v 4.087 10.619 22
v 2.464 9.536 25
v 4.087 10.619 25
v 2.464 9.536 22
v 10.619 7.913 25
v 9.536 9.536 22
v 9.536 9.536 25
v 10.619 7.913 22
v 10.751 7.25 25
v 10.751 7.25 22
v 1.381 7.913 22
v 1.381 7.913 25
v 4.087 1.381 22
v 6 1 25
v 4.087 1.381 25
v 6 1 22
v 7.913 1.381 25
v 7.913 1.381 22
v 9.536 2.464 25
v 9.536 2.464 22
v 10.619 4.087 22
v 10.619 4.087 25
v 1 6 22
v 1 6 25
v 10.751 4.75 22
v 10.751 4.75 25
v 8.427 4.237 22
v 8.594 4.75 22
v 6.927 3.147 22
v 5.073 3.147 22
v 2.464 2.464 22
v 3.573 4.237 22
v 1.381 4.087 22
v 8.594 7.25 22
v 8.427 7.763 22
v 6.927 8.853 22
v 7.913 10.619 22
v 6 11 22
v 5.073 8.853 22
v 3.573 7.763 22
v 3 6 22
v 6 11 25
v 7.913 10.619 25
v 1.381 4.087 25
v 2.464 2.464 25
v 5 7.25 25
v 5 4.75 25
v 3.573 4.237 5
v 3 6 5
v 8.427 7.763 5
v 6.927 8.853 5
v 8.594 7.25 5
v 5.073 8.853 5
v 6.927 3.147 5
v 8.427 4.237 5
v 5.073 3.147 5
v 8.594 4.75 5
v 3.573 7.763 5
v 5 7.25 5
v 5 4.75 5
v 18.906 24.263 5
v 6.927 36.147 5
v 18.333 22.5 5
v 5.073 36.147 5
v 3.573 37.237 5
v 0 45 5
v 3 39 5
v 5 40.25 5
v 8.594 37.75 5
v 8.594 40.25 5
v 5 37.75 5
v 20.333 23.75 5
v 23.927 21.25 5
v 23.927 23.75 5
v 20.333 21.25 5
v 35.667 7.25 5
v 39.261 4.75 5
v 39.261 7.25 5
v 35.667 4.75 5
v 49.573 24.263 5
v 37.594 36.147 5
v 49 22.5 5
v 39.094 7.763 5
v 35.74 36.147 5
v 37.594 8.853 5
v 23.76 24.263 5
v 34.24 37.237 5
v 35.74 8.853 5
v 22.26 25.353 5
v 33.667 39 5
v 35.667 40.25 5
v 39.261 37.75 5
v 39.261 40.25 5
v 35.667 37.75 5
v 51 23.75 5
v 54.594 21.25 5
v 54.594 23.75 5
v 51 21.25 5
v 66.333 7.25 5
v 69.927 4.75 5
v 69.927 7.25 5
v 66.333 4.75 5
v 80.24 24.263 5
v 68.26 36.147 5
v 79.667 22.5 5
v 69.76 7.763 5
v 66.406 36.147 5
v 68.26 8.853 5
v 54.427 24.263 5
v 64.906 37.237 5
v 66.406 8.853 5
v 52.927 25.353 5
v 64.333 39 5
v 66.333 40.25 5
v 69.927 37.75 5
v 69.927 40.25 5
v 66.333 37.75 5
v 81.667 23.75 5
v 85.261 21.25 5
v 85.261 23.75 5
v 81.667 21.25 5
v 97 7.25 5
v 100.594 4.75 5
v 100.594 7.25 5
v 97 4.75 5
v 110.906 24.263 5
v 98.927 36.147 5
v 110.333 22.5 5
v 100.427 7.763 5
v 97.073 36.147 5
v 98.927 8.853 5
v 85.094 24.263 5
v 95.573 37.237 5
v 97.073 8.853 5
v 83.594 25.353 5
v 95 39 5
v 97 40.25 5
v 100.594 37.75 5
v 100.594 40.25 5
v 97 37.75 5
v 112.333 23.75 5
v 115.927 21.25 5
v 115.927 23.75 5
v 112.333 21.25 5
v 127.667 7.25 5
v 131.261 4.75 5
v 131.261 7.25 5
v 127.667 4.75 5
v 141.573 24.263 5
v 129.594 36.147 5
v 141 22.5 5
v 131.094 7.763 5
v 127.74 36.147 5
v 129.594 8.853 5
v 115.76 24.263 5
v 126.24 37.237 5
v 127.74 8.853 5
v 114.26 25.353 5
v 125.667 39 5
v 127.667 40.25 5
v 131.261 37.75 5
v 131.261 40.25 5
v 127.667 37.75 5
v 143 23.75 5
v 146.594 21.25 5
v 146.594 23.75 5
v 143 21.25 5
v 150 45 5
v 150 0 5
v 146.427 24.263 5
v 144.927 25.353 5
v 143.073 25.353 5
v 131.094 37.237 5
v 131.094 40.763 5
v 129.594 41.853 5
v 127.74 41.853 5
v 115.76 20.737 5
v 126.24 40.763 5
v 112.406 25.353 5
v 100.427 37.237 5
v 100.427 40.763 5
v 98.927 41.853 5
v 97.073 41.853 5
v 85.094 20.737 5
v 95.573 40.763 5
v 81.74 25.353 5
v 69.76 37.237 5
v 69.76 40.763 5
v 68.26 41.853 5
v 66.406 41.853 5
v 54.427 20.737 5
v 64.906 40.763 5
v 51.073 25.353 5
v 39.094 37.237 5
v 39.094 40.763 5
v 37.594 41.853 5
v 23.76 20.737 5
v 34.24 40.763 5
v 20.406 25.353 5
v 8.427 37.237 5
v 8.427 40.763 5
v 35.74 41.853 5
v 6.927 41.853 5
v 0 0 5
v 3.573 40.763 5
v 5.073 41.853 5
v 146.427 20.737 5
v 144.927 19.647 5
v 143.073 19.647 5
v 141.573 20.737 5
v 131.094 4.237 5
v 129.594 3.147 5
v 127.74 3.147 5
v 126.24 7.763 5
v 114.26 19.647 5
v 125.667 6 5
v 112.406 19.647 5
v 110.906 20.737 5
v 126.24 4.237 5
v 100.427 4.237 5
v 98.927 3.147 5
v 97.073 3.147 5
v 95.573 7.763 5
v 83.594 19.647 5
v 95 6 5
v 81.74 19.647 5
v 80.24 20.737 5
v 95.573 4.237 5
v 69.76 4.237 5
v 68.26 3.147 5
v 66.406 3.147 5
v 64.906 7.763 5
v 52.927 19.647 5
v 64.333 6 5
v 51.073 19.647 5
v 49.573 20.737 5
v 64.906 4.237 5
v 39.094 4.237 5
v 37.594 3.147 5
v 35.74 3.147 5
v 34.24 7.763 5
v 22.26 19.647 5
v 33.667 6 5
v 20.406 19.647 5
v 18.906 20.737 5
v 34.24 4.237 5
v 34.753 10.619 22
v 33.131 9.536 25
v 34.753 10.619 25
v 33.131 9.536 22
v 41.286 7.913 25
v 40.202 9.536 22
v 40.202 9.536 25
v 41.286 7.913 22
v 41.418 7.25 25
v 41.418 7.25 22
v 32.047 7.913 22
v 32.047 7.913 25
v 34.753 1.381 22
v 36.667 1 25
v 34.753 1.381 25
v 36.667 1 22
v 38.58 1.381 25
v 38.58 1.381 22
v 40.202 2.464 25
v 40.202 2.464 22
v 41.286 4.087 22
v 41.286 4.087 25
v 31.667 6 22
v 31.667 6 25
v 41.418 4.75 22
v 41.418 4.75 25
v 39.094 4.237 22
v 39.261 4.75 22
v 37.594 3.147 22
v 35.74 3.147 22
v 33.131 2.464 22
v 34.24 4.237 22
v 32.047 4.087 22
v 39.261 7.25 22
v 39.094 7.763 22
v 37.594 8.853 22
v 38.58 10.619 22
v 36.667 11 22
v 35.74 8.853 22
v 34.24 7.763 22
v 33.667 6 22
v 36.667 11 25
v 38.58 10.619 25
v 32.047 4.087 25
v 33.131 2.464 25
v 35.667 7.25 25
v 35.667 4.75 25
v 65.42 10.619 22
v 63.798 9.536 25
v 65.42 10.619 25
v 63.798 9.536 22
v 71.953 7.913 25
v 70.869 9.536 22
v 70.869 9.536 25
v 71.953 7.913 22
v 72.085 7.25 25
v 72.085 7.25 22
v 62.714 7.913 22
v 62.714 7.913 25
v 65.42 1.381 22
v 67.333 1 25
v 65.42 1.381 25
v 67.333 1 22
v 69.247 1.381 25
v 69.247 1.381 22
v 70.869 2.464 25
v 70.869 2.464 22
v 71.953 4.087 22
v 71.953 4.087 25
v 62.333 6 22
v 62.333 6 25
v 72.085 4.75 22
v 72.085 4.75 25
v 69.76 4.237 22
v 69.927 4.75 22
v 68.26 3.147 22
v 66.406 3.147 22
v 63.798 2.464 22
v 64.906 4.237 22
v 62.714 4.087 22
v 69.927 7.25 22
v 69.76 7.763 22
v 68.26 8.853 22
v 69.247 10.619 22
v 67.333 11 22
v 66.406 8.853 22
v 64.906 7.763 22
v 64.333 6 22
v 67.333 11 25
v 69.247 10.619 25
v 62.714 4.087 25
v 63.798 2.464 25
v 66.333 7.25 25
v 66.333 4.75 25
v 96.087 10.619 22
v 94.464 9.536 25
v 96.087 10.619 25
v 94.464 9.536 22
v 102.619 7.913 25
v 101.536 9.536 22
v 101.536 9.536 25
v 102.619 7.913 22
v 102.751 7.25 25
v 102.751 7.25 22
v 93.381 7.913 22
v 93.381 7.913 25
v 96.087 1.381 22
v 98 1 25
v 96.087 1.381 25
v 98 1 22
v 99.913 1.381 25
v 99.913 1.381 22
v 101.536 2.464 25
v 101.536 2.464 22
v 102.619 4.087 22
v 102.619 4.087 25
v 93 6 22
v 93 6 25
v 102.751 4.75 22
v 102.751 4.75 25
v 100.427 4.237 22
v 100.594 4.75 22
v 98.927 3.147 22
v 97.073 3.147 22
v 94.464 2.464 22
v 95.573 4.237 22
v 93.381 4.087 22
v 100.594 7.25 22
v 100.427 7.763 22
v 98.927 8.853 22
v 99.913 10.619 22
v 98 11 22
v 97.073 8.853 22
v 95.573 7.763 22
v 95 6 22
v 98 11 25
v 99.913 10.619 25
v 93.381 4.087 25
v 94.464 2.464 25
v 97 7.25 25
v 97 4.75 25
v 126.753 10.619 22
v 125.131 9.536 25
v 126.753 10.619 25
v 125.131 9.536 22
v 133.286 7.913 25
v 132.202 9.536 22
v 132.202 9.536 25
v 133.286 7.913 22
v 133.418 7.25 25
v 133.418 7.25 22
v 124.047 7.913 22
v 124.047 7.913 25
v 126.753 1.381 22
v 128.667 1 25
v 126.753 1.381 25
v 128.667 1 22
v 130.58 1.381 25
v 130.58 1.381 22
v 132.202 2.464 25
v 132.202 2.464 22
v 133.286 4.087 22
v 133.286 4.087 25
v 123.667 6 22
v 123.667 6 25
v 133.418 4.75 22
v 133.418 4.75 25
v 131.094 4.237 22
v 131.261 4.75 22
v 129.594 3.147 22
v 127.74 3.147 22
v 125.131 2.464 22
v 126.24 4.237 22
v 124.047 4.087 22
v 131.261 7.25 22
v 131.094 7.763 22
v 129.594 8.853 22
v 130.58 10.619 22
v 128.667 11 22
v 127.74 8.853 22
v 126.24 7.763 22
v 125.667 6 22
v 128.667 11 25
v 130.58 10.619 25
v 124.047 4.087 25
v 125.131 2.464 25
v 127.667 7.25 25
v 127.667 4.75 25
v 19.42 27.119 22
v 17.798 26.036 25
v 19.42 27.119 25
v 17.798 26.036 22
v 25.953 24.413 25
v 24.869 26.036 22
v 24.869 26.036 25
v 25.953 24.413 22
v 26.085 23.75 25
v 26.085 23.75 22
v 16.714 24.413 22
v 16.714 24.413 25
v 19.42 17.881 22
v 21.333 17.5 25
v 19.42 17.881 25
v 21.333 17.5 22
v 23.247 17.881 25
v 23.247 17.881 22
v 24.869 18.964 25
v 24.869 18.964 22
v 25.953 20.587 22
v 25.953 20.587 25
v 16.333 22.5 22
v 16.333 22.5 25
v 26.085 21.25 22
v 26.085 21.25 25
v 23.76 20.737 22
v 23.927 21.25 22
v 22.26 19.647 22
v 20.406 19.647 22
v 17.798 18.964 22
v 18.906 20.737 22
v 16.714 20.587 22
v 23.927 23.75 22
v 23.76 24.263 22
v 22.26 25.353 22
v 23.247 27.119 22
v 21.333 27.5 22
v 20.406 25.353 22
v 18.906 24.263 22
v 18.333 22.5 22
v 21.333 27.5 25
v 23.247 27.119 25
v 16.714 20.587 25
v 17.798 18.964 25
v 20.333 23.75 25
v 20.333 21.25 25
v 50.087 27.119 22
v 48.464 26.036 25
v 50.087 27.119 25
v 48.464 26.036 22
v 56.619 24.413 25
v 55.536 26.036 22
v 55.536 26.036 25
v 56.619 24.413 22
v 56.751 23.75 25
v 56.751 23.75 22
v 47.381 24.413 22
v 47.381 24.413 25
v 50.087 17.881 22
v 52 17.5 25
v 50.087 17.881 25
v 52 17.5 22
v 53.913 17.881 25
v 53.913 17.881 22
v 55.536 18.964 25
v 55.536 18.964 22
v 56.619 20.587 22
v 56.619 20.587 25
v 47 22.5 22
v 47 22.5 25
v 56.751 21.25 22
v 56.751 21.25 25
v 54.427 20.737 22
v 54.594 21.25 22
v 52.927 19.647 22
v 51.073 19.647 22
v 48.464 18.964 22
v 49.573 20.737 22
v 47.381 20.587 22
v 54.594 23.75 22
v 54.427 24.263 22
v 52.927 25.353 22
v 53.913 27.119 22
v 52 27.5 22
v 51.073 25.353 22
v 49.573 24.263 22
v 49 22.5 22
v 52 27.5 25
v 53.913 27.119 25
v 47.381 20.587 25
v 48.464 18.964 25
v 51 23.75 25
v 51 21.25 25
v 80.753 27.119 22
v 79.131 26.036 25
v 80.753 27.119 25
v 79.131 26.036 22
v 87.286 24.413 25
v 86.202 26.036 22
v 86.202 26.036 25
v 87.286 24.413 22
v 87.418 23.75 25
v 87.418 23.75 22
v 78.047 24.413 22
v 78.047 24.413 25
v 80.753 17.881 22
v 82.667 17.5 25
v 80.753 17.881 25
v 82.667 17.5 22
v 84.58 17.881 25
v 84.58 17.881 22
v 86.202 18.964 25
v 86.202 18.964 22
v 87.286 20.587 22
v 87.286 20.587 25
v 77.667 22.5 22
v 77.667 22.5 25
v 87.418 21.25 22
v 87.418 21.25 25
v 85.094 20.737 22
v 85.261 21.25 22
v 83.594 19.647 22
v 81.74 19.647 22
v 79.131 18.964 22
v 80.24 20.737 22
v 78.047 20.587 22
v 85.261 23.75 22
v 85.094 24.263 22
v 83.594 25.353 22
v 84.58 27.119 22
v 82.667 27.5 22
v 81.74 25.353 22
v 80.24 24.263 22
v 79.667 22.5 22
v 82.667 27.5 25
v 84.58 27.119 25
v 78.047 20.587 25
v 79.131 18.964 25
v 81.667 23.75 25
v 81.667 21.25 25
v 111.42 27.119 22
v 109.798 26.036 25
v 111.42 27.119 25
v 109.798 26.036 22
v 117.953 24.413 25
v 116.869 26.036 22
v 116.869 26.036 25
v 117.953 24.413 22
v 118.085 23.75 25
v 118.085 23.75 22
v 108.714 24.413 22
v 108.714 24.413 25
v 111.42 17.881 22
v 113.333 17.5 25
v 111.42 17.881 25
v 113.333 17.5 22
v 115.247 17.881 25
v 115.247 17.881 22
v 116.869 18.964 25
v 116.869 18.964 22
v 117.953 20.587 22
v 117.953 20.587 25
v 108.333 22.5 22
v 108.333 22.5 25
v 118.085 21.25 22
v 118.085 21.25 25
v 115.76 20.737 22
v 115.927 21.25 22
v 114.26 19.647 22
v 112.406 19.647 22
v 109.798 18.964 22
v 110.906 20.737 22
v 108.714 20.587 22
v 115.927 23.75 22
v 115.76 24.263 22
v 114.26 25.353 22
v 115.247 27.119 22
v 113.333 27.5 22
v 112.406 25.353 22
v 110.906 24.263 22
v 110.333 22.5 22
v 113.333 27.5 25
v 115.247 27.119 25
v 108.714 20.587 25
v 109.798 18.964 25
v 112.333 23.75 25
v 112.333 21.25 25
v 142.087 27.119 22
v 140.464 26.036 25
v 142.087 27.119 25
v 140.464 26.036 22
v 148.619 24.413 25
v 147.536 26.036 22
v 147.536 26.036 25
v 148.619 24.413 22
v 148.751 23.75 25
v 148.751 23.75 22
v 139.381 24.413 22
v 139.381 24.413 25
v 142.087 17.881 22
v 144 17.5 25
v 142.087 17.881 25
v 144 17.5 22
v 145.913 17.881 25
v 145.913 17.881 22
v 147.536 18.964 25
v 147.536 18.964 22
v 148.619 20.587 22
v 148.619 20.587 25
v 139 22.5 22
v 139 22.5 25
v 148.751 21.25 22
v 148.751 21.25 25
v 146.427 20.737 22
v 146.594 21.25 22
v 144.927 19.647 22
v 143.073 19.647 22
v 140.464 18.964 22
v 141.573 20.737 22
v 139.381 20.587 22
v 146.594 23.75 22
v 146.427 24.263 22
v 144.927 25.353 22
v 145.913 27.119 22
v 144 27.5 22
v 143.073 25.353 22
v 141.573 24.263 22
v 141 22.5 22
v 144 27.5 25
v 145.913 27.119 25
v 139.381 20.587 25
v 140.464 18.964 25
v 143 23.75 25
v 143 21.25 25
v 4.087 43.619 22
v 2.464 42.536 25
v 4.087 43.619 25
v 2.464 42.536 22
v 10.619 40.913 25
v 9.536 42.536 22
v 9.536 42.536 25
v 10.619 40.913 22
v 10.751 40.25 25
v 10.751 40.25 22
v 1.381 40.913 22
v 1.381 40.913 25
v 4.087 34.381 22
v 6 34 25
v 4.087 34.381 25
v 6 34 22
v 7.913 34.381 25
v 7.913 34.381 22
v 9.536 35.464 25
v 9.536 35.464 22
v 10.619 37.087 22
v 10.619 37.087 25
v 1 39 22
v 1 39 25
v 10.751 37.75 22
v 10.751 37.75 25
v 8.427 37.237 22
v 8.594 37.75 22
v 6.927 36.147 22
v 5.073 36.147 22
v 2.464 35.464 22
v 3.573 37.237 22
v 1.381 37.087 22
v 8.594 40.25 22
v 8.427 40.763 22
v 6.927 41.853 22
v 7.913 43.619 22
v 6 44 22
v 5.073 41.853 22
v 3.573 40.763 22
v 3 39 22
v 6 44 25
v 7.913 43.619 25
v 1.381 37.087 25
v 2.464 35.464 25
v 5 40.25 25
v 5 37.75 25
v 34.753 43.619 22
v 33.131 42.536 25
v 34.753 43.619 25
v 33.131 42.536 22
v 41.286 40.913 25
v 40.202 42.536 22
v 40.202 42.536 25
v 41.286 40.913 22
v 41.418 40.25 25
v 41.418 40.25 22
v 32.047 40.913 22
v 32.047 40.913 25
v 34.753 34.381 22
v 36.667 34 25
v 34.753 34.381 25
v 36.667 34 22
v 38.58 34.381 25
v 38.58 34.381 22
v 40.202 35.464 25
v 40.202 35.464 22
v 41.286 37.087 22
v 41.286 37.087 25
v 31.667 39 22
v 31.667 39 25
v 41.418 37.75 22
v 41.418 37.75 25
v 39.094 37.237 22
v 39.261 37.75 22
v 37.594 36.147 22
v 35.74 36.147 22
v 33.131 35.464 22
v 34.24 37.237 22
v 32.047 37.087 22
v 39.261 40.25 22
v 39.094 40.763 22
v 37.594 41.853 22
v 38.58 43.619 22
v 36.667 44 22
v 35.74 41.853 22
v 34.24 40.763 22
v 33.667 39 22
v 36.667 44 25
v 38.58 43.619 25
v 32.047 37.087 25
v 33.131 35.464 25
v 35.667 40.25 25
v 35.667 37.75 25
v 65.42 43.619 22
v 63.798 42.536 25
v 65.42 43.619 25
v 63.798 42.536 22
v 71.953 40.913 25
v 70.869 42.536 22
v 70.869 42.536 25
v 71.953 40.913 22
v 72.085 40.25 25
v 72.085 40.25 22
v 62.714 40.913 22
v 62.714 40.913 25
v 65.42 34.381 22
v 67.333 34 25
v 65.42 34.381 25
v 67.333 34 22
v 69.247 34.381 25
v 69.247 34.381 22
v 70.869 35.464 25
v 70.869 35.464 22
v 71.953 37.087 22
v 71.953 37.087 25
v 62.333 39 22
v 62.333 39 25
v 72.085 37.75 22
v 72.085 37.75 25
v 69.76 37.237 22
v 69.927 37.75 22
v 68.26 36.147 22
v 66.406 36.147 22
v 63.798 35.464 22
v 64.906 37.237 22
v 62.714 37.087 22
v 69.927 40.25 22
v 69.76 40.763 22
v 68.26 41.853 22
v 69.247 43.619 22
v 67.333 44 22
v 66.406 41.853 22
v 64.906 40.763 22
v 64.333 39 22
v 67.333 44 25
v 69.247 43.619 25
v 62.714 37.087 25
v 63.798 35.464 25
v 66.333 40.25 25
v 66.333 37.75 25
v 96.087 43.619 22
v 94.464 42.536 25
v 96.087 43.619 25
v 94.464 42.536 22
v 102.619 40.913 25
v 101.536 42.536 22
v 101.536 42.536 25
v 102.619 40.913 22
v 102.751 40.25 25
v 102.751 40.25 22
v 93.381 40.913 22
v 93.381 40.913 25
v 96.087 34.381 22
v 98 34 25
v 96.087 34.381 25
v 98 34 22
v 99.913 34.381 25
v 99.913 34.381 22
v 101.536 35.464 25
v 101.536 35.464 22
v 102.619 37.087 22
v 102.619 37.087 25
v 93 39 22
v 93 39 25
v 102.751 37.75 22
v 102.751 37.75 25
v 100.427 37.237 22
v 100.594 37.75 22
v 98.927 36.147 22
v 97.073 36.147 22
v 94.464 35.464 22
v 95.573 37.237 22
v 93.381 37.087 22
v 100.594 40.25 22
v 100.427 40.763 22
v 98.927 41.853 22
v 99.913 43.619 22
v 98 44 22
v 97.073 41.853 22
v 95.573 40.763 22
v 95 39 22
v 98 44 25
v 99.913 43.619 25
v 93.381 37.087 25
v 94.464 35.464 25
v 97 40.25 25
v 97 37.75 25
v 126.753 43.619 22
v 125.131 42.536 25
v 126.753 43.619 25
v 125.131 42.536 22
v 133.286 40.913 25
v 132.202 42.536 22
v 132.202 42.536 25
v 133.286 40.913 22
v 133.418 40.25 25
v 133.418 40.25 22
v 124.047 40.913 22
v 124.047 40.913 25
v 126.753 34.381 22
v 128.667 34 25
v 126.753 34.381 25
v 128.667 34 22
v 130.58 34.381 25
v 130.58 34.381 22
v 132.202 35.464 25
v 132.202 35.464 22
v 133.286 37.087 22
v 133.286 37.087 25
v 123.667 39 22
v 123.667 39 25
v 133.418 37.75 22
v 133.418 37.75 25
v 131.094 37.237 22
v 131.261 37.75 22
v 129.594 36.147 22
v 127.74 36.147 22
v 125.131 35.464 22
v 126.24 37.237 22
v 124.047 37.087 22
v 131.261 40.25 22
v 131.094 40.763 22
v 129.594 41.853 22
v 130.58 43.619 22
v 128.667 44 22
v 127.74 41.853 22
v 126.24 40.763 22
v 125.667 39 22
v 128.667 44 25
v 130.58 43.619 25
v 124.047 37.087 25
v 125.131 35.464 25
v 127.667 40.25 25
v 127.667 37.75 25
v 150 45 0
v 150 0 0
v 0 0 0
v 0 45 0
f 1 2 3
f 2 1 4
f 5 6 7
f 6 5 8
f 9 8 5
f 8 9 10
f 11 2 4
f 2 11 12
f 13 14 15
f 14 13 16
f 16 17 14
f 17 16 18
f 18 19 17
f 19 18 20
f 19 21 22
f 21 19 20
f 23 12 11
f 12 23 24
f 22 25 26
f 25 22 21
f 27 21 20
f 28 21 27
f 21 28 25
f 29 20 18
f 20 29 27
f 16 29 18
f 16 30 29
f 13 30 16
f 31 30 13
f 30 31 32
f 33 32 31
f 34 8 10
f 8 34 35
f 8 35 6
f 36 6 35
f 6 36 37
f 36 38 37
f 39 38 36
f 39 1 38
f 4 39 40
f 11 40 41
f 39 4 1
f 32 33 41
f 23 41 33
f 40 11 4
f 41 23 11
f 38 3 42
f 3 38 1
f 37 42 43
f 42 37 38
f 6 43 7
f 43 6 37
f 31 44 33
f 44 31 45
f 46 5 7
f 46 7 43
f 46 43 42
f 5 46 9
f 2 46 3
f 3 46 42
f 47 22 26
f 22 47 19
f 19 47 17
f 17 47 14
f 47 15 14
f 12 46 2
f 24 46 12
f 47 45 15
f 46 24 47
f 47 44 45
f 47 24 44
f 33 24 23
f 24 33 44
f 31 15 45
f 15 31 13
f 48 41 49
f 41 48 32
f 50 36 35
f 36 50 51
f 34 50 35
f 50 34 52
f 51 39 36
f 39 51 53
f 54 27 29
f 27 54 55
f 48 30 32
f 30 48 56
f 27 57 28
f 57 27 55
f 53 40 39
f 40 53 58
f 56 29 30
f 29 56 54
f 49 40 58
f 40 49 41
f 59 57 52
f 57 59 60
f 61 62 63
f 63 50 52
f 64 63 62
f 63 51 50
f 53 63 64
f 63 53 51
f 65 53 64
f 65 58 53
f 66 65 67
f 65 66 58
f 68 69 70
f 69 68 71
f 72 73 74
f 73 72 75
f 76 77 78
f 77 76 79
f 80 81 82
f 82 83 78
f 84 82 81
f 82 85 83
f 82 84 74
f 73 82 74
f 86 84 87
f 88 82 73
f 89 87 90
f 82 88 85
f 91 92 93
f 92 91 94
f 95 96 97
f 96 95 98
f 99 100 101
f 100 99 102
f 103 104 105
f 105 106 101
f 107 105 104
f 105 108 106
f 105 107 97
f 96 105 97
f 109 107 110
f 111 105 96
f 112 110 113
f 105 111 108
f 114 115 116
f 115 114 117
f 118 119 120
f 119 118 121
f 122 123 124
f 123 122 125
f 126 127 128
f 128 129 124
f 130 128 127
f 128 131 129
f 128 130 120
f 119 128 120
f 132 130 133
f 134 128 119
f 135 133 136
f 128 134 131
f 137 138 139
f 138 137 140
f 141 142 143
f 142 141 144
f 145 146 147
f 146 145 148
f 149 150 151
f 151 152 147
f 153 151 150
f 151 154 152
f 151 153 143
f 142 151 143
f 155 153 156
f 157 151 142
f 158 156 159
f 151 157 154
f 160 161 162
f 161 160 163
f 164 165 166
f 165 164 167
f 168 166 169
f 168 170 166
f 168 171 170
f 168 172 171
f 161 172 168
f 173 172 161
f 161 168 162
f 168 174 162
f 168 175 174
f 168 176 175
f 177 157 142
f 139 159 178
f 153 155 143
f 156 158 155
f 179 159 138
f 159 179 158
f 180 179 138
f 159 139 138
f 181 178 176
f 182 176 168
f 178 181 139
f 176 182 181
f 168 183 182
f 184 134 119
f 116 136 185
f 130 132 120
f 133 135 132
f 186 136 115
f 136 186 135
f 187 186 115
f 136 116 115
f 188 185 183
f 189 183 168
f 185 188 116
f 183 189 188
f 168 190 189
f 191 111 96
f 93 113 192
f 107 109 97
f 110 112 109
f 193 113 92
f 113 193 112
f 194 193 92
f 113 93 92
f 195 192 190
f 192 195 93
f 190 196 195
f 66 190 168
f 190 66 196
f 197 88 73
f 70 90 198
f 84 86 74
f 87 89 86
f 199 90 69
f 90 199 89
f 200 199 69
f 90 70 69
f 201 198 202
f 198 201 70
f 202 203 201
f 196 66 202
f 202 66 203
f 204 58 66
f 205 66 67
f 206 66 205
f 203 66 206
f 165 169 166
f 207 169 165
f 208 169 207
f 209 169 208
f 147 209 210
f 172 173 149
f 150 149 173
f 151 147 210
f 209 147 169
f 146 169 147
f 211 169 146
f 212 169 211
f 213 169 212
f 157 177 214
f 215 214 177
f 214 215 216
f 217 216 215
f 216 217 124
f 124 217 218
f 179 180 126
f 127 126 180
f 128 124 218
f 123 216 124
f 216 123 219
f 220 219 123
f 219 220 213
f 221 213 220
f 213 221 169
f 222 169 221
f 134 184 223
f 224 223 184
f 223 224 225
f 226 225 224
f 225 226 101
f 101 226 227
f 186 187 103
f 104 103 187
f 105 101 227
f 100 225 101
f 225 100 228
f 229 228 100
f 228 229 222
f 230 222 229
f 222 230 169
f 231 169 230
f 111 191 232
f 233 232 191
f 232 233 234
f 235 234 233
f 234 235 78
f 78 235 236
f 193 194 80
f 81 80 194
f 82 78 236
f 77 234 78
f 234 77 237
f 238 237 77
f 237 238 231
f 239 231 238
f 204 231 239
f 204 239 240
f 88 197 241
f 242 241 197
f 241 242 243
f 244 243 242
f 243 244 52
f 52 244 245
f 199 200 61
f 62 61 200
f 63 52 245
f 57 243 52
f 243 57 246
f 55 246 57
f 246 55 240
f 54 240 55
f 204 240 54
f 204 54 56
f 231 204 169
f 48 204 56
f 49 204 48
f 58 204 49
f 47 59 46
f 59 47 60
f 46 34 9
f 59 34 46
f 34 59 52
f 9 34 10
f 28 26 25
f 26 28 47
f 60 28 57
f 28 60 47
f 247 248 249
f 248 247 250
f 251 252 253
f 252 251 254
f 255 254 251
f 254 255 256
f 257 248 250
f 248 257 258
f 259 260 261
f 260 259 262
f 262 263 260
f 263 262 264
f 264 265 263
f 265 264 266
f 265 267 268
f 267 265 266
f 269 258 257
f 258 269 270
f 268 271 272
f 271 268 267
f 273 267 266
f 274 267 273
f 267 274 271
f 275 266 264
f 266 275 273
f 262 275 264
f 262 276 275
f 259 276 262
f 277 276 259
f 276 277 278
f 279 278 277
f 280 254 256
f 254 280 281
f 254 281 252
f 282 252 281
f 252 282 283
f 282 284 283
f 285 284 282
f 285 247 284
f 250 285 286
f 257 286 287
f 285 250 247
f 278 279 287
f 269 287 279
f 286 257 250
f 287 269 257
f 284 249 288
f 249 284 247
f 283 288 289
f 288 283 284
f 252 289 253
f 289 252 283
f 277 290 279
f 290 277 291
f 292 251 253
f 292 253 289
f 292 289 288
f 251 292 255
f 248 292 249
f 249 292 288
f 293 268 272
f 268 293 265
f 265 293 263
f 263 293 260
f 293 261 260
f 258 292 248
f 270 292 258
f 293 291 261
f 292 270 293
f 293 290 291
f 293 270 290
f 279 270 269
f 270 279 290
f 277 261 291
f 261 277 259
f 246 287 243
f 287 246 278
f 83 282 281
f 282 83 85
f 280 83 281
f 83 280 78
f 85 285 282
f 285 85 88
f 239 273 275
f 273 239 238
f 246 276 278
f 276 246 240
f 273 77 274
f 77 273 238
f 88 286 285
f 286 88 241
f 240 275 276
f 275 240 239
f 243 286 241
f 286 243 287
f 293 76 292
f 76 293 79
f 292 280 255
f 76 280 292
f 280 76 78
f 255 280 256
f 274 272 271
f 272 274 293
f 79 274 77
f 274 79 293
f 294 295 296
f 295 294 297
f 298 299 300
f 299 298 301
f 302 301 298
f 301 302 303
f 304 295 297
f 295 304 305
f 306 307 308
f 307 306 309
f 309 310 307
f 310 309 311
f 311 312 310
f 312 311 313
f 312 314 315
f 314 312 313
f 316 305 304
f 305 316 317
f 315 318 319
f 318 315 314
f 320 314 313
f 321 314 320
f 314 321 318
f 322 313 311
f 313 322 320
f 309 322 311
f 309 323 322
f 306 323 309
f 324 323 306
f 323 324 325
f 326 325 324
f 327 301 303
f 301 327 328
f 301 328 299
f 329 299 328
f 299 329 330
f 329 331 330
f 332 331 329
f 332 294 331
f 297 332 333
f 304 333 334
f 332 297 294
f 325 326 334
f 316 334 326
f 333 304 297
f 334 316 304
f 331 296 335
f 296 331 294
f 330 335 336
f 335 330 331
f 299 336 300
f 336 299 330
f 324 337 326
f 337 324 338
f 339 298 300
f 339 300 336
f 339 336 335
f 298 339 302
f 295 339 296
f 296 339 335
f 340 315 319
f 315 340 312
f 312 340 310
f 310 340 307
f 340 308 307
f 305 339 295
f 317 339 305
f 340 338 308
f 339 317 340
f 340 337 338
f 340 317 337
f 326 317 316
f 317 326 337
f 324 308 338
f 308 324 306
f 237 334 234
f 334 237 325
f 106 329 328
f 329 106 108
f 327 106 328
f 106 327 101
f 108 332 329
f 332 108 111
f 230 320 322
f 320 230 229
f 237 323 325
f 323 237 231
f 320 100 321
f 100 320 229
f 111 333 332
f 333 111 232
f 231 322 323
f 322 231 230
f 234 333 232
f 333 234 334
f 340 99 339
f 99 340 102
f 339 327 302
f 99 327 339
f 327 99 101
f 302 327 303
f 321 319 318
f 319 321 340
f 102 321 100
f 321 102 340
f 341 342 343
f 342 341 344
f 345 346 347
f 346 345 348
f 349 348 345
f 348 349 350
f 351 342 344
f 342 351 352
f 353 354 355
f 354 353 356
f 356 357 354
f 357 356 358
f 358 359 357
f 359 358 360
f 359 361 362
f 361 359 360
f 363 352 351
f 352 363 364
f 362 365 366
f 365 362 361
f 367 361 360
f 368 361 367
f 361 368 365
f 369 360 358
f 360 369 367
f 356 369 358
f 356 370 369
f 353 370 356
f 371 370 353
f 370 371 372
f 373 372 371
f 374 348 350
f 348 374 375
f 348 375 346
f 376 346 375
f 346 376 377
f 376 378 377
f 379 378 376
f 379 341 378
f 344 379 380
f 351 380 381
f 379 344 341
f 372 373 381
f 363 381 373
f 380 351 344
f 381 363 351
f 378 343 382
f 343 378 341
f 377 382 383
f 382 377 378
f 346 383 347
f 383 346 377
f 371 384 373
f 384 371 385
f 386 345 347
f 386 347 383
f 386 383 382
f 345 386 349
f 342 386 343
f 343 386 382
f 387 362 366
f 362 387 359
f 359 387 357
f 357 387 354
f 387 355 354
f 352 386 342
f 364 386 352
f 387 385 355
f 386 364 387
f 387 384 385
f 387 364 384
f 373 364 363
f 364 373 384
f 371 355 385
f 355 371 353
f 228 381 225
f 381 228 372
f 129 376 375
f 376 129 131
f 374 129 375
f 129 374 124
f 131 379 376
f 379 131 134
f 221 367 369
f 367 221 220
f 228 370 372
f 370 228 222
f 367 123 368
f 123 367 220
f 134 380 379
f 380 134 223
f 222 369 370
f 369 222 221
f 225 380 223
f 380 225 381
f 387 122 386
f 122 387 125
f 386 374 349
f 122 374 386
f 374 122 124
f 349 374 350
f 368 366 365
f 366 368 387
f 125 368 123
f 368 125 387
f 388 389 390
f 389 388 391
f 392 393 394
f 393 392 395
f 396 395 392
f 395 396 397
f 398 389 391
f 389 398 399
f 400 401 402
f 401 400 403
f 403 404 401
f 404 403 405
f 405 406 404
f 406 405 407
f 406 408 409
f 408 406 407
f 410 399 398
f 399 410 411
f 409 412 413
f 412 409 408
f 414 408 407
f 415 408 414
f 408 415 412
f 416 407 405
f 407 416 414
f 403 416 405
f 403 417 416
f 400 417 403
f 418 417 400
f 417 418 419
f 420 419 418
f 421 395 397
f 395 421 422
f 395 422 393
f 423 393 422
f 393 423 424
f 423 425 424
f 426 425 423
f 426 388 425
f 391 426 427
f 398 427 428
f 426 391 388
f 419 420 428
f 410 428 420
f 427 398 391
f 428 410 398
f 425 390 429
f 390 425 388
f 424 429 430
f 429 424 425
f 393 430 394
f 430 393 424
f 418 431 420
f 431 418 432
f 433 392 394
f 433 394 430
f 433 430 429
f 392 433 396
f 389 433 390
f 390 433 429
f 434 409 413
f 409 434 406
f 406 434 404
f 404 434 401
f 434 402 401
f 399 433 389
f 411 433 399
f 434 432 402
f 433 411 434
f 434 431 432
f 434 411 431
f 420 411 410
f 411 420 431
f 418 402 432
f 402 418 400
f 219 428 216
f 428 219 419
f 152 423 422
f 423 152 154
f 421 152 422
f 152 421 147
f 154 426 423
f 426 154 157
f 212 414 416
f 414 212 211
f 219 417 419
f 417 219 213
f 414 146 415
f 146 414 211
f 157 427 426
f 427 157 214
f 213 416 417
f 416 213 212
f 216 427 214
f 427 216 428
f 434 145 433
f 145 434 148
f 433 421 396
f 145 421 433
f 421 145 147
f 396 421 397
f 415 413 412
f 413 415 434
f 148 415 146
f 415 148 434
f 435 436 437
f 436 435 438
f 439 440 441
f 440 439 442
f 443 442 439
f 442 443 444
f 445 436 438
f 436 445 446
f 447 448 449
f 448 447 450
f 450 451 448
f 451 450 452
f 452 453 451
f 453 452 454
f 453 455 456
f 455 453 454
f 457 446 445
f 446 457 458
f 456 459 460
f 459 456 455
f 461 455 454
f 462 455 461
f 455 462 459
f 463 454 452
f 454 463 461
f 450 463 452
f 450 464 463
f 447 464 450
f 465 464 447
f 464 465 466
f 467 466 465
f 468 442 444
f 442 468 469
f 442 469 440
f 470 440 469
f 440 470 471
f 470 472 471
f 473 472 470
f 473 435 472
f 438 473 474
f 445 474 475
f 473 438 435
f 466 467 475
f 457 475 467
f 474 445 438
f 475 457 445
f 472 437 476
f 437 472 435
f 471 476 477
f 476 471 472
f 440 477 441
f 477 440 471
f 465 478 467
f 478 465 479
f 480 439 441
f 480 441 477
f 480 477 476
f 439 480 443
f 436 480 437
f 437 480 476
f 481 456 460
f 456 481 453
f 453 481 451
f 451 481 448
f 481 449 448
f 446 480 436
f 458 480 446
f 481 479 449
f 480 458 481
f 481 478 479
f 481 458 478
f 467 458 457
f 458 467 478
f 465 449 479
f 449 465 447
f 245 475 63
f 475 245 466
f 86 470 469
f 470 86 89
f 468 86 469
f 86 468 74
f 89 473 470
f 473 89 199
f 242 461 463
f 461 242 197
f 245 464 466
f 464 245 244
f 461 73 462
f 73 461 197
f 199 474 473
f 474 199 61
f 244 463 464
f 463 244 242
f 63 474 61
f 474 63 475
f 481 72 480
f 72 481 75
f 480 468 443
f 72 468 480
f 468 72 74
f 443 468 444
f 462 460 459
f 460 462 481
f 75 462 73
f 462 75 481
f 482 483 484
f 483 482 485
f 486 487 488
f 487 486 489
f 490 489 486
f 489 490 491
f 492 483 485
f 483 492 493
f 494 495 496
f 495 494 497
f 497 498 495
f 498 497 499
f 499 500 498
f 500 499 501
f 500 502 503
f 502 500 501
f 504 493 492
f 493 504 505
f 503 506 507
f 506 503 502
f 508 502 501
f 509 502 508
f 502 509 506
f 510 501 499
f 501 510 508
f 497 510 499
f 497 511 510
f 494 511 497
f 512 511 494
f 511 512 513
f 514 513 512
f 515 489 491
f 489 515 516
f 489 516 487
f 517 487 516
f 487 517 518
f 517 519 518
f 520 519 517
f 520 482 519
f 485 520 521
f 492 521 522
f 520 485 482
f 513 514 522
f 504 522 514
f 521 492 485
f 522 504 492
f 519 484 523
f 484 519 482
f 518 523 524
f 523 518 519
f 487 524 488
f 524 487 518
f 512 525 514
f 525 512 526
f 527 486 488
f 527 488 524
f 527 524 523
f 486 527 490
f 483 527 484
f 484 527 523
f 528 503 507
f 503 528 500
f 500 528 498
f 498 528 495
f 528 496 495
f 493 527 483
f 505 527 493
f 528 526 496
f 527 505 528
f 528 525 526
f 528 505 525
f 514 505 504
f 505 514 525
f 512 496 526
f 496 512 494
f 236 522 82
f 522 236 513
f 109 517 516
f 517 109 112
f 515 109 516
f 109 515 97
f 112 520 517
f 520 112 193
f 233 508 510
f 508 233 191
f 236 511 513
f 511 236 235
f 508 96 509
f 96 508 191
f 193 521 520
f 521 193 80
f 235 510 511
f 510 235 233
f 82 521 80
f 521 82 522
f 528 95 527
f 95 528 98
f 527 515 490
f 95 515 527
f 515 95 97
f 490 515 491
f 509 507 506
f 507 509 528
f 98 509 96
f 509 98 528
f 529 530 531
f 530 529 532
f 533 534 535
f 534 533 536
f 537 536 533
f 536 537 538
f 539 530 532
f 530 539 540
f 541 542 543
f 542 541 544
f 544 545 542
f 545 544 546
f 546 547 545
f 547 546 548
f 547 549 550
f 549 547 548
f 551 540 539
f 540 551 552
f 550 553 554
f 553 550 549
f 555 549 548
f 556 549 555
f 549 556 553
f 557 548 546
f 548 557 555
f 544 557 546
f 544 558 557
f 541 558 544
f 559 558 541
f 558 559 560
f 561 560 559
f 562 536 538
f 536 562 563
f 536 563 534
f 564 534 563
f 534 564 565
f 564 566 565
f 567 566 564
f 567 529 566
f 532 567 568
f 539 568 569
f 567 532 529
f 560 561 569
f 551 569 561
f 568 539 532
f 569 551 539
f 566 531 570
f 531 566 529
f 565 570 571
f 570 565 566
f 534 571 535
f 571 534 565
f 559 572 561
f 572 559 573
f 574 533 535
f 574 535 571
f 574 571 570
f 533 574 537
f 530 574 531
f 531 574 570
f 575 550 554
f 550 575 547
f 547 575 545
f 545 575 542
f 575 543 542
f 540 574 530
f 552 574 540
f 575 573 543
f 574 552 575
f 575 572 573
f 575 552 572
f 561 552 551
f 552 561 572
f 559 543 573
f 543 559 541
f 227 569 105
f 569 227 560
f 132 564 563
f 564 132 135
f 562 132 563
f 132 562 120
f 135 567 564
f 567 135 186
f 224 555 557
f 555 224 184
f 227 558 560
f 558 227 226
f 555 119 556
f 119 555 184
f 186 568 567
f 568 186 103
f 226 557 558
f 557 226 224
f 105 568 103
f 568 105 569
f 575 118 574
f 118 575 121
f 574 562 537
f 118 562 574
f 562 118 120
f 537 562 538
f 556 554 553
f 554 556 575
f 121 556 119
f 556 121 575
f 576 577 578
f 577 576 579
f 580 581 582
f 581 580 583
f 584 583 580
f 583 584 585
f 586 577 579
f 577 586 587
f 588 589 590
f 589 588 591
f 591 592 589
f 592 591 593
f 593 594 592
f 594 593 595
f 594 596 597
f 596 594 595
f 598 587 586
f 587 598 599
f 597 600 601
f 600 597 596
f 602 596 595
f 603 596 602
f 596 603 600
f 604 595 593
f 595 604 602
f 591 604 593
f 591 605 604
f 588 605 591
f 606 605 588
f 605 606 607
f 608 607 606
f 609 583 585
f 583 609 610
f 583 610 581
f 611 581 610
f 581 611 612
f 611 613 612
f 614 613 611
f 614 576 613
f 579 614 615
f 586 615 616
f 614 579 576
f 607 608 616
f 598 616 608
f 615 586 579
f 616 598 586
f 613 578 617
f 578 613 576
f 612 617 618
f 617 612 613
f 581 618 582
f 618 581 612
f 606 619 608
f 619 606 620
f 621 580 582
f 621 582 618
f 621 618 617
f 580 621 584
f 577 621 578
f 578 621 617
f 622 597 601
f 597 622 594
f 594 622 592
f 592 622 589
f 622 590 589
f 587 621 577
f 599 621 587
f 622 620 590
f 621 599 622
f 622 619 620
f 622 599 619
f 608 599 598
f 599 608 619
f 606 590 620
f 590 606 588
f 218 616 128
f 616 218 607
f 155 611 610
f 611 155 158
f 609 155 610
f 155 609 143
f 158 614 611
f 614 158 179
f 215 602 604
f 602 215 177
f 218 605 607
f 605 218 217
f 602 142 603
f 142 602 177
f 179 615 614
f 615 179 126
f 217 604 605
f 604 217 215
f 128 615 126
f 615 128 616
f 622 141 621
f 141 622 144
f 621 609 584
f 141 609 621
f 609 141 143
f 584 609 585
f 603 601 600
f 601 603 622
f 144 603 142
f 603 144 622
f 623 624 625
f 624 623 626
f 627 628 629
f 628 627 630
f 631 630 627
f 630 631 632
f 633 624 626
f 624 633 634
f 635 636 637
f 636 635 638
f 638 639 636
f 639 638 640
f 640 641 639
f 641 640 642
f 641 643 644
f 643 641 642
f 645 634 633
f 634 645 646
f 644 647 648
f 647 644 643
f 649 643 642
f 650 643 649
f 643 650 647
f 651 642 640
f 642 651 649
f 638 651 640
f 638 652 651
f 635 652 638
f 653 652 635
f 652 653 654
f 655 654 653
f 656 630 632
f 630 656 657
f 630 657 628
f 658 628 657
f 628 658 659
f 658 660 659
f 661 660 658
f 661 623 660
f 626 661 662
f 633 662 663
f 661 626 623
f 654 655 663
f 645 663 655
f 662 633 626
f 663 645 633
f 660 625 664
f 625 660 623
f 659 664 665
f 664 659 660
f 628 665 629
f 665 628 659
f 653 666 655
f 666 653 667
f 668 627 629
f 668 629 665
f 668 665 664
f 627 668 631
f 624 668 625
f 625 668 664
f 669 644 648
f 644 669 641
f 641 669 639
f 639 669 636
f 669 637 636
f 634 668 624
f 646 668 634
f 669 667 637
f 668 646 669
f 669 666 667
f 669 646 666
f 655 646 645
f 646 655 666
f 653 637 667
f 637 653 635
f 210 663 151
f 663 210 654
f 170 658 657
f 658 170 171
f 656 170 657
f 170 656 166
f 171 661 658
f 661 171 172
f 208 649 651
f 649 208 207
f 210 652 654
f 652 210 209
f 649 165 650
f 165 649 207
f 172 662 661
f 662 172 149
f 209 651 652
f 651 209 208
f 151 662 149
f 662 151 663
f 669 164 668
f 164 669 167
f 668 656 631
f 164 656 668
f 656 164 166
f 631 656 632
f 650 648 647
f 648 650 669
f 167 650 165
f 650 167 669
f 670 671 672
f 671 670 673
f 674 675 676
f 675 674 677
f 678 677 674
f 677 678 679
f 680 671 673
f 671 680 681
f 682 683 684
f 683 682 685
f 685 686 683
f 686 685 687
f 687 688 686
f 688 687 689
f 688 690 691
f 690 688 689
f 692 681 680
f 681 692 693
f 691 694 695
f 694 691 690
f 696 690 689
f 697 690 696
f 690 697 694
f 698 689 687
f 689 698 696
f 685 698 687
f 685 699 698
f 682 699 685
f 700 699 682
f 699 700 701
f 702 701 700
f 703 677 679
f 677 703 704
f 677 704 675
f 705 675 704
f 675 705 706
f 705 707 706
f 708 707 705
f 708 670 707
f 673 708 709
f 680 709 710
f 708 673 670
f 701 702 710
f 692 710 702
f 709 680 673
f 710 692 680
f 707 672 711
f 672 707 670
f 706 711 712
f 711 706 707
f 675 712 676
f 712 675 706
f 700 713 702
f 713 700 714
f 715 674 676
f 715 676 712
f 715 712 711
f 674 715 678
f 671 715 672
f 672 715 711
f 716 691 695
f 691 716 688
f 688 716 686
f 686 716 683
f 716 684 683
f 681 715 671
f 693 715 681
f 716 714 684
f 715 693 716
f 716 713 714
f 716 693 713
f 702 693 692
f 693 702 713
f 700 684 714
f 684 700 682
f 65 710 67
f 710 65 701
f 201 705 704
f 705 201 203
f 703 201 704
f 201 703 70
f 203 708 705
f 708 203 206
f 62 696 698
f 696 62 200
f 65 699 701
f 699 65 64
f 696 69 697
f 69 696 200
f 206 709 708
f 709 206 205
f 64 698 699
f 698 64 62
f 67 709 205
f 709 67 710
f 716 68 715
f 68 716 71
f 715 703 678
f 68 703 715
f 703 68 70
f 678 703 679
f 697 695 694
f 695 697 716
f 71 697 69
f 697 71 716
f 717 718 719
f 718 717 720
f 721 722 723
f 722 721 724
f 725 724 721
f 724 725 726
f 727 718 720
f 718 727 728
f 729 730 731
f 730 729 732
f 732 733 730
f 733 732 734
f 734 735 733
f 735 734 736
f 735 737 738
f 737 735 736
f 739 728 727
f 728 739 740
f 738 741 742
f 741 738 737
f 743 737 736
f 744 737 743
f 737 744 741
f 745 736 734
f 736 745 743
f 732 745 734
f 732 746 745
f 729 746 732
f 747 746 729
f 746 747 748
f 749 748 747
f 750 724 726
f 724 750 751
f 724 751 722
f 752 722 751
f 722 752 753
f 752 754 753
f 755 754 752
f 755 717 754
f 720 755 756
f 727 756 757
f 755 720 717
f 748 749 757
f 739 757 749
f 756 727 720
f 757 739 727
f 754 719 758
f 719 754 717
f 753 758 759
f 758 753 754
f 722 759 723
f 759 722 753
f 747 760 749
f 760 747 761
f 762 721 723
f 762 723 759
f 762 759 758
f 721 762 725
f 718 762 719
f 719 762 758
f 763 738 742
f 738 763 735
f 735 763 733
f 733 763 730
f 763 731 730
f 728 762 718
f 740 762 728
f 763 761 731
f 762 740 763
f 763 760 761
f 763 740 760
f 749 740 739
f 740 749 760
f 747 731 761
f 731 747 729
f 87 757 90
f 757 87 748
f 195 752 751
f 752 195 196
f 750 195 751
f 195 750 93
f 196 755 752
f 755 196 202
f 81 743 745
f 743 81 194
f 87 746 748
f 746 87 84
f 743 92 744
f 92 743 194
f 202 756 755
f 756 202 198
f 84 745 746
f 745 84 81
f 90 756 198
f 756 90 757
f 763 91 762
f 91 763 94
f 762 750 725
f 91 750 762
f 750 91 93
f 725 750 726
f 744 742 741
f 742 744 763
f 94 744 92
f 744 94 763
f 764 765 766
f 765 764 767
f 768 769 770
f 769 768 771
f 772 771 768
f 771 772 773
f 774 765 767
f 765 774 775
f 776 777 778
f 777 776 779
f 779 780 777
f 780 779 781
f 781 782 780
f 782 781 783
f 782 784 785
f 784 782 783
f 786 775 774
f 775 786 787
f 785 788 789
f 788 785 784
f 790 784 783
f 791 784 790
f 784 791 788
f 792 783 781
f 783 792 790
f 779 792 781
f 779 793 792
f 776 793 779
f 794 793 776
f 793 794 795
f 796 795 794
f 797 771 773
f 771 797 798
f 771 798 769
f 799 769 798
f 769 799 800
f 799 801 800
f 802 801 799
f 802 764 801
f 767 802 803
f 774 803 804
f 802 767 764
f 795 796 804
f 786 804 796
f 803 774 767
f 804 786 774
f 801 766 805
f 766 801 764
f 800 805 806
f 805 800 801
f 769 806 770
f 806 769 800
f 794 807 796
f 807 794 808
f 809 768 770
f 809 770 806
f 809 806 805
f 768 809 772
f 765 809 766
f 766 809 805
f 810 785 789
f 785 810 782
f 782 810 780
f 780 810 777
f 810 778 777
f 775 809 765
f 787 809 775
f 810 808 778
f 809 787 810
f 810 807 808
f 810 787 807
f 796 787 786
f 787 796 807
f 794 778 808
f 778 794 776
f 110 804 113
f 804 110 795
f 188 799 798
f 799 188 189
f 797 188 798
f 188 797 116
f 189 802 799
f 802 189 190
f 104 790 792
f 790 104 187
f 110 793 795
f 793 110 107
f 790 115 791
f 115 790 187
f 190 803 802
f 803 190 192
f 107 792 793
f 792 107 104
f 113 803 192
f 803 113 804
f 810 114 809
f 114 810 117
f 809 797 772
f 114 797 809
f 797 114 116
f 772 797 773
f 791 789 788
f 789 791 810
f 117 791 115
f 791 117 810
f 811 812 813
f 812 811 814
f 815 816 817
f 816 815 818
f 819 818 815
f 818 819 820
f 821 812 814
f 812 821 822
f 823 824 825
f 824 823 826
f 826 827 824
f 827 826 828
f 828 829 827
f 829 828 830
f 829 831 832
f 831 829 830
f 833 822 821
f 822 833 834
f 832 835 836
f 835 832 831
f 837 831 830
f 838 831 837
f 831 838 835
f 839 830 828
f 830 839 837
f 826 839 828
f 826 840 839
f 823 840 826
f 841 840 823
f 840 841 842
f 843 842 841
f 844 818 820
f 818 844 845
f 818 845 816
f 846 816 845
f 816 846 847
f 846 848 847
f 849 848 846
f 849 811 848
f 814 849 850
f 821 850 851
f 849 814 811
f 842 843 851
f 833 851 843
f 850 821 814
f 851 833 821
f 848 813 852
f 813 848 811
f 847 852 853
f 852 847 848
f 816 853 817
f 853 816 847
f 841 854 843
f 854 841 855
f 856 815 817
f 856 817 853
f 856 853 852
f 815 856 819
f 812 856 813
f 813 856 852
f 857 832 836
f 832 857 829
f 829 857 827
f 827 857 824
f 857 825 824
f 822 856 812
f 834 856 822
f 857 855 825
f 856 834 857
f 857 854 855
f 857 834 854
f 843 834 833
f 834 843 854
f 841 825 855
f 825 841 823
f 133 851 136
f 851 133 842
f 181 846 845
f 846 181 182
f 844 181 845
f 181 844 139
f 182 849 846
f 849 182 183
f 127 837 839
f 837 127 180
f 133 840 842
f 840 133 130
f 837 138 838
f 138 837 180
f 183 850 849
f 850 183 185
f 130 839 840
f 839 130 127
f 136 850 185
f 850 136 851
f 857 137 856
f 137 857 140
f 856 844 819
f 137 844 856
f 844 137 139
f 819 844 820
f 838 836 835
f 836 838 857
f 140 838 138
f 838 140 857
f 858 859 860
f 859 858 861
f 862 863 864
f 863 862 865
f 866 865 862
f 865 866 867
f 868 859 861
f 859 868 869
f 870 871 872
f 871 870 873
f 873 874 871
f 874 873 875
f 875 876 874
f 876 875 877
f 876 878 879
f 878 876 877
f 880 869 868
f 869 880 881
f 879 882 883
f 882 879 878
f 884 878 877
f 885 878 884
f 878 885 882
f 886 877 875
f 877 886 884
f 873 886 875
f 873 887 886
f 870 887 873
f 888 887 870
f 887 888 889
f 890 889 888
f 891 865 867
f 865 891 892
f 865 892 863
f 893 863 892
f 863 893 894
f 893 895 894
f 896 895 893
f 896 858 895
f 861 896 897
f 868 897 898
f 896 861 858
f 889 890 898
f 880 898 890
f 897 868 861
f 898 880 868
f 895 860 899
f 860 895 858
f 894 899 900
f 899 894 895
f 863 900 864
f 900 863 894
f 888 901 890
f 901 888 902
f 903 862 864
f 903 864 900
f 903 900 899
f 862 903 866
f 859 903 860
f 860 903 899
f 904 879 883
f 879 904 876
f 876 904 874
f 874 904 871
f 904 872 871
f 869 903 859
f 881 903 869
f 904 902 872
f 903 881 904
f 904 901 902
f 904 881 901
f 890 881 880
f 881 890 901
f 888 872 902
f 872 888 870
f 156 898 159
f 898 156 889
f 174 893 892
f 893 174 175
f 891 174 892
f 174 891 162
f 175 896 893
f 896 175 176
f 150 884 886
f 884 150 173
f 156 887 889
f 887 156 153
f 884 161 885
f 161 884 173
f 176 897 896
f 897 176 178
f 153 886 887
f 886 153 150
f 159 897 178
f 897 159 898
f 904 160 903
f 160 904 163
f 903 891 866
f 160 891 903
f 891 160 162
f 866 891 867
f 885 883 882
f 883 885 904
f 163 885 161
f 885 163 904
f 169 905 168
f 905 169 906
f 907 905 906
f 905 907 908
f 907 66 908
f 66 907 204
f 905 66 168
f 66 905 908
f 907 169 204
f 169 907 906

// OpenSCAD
//Size of base X
base_Y = 45; // [10:500]

//Size of base Y
base_X = 150; // [10:500]

//Thickness of base
base_thickness = 5;

//Peg thickness
peg_thickness = 3; // [1:10]

//Peg height
peg_height = 20; // [10:50]

//Gap width in peg
gap_width = 2.5;

//Number of pegs on X axis
X_pegs = 5;

//Width of step on top of peg
step_width = 2; // [0:5]

//% of peg height for step
step_percent = 15; // [5:90]

module core()
{
translate([0,0,(peg_height+base_thickness)-peg_height*(step_percent/100)])cylinder(peg_height*(step_percent/100),peg_thickness+step_width,peg_thickness+step_width);
translate([0,0,base_thickness])cylinder(peg_height,peg_thickness,peg_thickness);
}

module peg()
{
difference()
{core();
translate([-peg_thickness/3,-gap_width/2,base_thickness])cube([peg_thickness*3,gap_width,peg_height]);
}
}
cube([base_X,base_Y,base_thickness]);
peg_line();
translate([((base_X-peg_thickness*4)/(X_pegs-.5))*.5,((base_Y-peg_thickness*4)/2),0])peg_line();
translate([0,base_Y-(peg_thickness*4),0])peg_line();
module peg_line()
{
for (i = [0 : X_pegs-1] ){
translate([((base_X-peg_thickness*4)/(X_pegs-.5))*(i)+peg_thickness*2,peg_thickness*2,0]) peg();
}
}
